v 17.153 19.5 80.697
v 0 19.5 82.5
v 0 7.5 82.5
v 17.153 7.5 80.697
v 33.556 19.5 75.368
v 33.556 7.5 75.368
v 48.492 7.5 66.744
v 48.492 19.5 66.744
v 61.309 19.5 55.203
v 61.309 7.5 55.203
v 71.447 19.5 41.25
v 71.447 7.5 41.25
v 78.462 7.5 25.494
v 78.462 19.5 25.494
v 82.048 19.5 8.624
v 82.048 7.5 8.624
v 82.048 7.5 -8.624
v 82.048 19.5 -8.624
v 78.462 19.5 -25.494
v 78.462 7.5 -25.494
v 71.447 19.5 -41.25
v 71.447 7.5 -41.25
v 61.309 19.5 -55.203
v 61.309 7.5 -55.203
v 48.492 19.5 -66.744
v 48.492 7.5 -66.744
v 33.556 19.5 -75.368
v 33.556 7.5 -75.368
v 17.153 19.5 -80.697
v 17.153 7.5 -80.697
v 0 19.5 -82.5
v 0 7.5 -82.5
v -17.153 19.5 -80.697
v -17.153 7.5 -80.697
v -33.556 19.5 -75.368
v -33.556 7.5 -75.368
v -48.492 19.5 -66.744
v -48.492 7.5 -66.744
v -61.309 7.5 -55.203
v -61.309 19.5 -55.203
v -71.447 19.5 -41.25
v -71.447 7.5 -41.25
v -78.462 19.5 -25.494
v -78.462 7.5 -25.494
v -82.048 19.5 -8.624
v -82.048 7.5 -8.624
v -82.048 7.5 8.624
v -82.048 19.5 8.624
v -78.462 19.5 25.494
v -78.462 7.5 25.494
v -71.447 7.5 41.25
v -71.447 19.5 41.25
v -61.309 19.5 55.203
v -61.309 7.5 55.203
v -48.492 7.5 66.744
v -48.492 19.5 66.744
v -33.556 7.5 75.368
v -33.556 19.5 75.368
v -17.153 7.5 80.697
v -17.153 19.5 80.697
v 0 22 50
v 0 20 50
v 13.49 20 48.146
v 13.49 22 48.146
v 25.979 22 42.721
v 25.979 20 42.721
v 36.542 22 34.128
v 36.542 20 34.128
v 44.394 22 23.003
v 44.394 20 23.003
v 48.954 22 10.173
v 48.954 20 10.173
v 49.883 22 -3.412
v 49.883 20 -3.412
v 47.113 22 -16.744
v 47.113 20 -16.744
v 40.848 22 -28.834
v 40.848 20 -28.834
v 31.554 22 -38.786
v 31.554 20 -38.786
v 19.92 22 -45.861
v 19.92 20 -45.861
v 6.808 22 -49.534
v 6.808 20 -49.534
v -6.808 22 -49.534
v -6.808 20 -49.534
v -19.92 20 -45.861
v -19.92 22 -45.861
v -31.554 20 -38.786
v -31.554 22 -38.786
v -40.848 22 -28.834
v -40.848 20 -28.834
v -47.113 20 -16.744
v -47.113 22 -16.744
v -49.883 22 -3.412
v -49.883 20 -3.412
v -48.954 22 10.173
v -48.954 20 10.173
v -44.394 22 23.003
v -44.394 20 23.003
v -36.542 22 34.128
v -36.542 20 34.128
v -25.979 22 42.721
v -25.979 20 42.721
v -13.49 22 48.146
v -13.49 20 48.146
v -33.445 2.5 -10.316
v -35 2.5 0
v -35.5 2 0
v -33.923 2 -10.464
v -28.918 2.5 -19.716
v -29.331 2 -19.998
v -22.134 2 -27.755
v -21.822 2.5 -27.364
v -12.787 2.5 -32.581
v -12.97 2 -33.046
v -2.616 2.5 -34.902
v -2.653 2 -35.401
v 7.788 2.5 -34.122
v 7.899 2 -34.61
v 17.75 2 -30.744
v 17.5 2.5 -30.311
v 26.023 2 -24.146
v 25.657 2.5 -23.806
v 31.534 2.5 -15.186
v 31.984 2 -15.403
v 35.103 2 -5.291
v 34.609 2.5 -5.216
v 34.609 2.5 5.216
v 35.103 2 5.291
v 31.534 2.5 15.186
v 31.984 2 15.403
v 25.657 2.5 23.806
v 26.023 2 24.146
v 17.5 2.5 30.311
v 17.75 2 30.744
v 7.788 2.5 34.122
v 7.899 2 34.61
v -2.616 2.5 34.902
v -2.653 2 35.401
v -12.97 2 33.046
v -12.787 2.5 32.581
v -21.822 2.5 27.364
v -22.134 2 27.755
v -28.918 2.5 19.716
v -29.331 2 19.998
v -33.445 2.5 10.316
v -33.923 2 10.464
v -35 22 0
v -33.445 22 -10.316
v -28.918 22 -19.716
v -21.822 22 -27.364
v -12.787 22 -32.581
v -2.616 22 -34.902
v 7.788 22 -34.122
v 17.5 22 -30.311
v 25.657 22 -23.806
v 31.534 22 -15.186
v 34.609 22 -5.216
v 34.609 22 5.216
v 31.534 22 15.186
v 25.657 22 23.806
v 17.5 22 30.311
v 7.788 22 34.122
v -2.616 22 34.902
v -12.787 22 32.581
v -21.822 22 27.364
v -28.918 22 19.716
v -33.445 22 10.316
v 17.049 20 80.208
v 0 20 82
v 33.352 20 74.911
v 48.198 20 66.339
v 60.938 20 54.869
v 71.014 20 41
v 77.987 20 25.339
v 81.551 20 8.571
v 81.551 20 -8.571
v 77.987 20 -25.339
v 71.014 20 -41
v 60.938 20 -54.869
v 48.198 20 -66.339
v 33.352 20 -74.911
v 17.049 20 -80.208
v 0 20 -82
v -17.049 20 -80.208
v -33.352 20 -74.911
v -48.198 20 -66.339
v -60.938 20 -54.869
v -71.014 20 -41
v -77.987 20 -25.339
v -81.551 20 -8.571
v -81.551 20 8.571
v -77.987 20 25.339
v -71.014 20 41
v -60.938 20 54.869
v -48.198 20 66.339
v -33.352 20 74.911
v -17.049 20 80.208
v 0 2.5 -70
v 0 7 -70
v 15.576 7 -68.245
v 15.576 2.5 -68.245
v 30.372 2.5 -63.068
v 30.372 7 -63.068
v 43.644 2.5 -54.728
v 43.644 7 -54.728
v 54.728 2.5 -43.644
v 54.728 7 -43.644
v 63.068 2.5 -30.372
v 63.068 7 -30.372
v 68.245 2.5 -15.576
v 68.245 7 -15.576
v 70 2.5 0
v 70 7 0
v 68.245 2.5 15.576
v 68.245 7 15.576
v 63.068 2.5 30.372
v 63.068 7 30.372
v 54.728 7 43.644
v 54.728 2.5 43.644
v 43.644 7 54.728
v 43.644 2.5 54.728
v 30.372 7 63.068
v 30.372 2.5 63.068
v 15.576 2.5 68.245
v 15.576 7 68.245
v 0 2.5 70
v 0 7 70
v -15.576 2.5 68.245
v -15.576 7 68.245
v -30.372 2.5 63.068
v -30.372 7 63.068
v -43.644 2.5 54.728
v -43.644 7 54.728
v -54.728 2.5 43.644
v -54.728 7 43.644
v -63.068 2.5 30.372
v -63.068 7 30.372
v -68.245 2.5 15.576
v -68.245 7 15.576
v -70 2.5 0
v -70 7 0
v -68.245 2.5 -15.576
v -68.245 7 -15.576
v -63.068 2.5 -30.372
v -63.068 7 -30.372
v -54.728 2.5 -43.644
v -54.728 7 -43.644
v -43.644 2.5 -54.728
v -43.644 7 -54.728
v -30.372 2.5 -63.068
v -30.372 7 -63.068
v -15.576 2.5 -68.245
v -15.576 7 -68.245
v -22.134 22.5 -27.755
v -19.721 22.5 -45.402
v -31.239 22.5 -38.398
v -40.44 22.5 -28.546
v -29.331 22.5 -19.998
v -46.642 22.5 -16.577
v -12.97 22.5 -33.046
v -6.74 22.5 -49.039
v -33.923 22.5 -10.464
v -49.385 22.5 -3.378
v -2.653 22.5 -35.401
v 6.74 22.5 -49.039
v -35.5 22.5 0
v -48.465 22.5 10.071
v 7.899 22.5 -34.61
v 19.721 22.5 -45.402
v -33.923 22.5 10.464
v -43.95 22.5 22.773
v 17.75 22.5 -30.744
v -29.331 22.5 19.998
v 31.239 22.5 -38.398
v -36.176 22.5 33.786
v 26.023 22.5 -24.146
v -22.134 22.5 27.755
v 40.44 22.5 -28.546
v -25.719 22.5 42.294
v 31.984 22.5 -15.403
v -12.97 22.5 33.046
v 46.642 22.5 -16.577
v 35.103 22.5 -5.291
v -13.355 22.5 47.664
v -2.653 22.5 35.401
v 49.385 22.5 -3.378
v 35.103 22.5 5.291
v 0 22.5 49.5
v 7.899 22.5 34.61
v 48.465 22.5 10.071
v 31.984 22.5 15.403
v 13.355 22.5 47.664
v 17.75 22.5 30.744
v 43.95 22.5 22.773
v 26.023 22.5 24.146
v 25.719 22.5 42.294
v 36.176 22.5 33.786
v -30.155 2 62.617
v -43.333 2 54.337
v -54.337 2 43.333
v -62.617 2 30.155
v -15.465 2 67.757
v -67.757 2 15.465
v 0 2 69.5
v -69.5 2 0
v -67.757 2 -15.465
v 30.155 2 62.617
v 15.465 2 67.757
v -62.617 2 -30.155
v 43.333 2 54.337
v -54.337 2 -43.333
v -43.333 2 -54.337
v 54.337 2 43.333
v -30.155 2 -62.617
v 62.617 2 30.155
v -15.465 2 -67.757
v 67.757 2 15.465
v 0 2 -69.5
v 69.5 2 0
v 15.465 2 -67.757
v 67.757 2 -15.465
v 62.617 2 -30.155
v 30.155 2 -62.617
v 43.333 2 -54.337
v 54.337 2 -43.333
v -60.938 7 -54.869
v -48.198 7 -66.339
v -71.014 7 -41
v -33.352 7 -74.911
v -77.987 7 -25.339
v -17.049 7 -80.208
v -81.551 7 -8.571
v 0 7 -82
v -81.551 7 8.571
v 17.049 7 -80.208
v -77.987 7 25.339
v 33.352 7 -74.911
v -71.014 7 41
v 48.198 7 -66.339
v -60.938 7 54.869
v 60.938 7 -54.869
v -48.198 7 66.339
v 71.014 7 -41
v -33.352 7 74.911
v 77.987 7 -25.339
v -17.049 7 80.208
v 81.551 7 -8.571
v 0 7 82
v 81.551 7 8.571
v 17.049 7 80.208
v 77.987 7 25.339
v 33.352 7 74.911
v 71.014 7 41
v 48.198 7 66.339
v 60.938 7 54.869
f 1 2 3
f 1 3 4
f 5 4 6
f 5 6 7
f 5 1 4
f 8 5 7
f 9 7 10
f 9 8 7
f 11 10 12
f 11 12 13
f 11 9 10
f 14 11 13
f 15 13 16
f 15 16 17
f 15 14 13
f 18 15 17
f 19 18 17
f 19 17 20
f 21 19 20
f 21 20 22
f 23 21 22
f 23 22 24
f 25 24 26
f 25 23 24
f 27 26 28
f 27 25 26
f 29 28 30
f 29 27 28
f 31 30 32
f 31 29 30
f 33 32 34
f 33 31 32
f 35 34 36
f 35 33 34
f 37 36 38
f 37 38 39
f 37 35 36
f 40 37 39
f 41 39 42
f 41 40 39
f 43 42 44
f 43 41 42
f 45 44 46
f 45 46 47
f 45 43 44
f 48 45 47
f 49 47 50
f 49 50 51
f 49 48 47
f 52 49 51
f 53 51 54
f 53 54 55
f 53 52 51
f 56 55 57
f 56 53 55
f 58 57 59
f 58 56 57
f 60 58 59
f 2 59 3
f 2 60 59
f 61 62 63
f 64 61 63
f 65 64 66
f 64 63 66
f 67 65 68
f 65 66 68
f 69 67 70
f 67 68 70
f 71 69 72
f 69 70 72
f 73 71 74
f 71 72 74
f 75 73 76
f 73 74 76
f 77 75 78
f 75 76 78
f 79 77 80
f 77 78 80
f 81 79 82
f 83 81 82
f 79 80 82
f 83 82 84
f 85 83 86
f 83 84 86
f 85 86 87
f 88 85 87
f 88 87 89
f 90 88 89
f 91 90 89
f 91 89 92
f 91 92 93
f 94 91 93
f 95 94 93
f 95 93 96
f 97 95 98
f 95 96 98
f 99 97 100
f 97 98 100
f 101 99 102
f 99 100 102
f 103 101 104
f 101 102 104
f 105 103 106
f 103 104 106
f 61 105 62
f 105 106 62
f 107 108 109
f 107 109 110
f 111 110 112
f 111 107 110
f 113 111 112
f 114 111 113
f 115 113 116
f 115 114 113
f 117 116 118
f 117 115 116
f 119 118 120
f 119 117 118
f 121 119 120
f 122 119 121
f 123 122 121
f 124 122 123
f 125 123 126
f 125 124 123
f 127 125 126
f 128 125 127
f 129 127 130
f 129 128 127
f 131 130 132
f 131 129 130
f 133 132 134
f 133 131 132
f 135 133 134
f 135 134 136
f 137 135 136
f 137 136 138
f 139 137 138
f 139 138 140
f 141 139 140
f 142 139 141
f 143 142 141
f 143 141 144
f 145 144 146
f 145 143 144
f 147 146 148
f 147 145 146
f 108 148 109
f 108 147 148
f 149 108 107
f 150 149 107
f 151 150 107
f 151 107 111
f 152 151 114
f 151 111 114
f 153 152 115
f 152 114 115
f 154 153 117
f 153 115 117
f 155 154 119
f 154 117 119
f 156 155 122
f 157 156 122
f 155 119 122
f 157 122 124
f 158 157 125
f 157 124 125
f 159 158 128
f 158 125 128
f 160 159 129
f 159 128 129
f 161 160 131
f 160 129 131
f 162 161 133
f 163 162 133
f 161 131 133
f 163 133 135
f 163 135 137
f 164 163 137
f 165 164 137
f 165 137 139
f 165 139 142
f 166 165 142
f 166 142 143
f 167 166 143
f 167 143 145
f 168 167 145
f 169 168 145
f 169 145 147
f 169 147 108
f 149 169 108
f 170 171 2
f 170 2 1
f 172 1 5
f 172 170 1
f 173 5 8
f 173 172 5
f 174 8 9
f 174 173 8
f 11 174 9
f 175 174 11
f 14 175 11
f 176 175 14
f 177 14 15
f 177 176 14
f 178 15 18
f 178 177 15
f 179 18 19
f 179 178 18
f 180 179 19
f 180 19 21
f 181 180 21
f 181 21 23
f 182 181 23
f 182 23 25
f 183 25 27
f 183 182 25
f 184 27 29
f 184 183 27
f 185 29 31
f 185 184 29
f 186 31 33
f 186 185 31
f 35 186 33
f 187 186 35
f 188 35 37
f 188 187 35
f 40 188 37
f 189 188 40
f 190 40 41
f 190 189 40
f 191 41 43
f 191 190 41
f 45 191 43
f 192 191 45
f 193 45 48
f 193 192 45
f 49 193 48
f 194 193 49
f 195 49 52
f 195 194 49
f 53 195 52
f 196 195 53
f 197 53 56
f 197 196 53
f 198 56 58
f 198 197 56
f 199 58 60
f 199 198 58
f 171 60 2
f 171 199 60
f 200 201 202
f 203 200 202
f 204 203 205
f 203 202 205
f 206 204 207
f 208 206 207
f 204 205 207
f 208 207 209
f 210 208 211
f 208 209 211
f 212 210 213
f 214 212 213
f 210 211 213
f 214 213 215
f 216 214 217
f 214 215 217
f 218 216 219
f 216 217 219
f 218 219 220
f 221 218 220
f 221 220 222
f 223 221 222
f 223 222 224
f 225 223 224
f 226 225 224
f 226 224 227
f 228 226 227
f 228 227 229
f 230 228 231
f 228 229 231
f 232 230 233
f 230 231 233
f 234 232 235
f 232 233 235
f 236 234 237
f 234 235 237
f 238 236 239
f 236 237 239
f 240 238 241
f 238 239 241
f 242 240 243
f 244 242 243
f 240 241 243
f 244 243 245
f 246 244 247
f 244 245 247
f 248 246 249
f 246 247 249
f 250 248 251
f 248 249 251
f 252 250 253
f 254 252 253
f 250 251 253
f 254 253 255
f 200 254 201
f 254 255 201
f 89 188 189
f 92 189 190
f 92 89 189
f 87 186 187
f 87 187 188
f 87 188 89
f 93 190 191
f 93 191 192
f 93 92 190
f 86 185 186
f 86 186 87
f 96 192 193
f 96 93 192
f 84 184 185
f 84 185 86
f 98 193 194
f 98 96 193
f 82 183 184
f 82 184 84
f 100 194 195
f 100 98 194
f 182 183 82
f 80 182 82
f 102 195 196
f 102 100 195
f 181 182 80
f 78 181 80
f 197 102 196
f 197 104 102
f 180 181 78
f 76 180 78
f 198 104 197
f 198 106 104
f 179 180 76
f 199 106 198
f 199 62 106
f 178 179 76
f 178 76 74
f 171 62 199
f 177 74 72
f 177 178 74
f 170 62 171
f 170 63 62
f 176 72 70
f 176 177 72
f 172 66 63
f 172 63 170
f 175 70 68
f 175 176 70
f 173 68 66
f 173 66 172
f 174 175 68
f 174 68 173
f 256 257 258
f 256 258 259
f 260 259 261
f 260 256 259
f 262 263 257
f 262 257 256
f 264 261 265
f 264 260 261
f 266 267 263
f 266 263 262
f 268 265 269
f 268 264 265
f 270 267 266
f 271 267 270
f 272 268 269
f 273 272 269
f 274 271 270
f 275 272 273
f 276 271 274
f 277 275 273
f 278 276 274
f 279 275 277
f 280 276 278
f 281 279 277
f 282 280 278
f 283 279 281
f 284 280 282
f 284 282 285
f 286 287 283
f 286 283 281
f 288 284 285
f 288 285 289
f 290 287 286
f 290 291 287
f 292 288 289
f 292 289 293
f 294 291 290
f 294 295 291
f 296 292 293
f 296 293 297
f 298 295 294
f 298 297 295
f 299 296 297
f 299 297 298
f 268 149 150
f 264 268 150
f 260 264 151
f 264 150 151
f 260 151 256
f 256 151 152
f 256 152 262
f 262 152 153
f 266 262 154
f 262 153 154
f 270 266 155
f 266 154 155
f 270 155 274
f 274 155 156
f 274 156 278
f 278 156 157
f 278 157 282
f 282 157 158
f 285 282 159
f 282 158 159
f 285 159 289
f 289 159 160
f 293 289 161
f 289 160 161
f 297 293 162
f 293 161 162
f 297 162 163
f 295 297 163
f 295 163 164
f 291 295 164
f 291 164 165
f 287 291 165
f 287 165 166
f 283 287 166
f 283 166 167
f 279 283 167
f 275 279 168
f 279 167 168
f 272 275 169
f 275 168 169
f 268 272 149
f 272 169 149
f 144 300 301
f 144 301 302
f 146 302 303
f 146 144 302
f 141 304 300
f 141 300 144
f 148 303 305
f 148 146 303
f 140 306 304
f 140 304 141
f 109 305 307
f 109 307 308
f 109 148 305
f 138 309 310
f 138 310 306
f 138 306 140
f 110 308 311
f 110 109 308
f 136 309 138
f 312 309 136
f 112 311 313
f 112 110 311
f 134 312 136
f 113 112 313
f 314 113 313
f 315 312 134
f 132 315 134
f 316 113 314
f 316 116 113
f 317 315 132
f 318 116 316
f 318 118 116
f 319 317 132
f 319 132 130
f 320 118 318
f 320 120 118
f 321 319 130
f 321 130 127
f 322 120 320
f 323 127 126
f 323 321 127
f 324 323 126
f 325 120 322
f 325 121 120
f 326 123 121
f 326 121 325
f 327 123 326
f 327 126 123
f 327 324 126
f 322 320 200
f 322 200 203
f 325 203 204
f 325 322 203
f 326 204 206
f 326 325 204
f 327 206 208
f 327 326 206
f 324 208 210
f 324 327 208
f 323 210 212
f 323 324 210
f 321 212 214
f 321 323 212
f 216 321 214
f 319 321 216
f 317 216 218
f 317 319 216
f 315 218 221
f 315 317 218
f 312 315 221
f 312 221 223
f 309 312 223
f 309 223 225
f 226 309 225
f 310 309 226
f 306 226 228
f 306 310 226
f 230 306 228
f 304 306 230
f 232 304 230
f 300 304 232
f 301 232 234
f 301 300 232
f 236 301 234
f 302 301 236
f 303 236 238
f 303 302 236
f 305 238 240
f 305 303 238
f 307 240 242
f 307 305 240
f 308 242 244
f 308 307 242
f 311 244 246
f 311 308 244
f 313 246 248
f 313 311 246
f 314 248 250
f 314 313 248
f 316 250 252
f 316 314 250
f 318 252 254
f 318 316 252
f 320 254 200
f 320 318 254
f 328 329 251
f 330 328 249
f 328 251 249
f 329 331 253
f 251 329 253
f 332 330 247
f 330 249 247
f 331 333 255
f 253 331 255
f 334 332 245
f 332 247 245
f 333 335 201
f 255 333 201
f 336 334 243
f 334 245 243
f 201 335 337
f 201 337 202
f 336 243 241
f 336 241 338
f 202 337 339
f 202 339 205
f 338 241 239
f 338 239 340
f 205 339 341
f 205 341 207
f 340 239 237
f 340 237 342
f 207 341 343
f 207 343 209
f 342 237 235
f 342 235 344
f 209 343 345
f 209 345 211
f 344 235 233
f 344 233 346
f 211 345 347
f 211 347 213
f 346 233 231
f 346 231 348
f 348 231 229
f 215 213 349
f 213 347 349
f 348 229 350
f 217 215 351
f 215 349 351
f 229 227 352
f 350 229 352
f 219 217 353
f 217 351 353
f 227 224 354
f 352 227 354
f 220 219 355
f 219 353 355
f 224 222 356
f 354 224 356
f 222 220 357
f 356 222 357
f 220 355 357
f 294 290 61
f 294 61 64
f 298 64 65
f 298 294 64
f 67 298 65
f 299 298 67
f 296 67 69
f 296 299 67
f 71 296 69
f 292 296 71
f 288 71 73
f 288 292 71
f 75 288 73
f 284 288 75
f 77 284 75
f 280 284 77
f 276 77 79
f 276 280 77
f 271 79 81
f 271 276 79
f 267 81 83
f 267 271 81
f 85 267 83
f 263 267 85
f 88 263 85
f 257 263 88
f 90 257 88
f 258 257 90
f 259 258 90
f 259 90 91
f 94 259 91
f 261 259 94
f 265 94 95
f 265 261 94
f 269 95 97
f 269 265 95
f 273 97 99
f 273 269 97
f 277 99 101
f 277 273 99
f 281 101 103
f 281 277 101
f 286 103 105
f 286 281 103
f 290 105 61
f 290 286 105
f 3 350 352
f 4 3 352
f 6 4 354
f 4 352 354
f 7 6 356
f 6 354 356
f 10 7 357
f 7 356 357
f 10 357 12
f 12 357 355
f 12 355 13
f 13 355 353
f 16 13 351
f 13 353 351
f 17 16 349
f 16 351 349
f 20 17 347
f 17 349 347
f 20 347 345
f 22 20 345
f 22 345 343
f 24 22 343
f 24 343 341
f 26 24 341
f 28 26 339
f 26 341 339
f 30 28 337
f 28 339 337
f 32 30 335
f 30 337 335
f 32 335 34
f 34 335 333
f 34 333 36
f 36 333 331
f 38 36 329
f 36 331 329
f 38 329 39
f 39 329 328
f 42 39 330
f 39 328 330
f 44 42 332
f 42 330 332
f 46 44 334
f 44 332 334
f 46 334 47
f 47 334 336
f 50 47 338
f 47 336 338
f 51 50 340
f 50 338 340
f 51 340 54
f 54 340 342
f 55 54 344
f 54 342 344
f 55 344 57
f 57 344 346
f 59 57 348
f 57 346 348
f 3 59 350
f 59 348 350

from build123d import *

# Parameters (mm, degrees)
SKETCH_1_W      = 82.5
SKETCH_1_H      = 13
SKETCH_2_R      = 70
EXTRUDE_1_DEPTH = 5
SKETCH_3_R      = 50
EXTRUDE_2_DEPTH = 2.5
HOLE_WIZARD_2_D = 70
CHAMFER_1_SIZE  = 0.5


with BuildPart() as part:
    # 草圖1 → 旋轉1 (revolve)
    with BuildSketch(Plane(origin=(0, 0, 0), x_dir=(-1, 0, 0), z_dir=(0, 0, -1)), mode=Mode.PRIVATE) as revolve_1_sk:
        with Locations((-41.25, 13.5)):
            Rectangle(SKETCH_1_W, SKETCH_1_H)
    revolve(revolve_1_sk.sketch.rotate(Axis((0, 7, 0), (0, 1, 0)), 270), axis=Axis((0, 7, 0), (0, 1, 0)))

    # 草圖2 → 填料-伸長1 (add)
    with BuildSketch(Plane.XZ.offset(-7)):
        with Locations(Location((0, 0, 0), (0, 0, 270))):
            Circle(SKETCH_2_R)
    extrude(amount=EXTRUDE_1_DEPTH)

    # 草圖3 → 填料-伸長2 (add)
    with BuildSketch(Plane(origin=(0, 20, 0), x_dir=(-1, 0, 0), z_dir=(0, 1, 0))):
        with Locations(Location((0, 0, 0), (0, 0, 90))):
            Circle(SKETCH_3_R)
    extrude(amount=EXTRUDE_2_DEPTH)

    # 鑽孔2 (through all)
    with Locations(Plane(origin=(0, 22.5, 0), x_dir=(1, 0, 0), z_dir=(0, 1, 0))):
        with Locations((0, 0)):
            Hole(HOLE_WIZARD_2_D / 2)

    # 導角1
    chamfer_1_edges = [part.edges().sort_by_distance(p)[0] for p in [
        (0, 2, 70),
        (0, 22.5, -50),
        (35, 22.5, 0),
        (35, 2, 0),
        (0, 20, -82.5),
        (0, 7, -82.5),
    ]]
    chamfer(chamfer_1_edges, length=CHAMFER_1_SIZE)


solid = part.part
